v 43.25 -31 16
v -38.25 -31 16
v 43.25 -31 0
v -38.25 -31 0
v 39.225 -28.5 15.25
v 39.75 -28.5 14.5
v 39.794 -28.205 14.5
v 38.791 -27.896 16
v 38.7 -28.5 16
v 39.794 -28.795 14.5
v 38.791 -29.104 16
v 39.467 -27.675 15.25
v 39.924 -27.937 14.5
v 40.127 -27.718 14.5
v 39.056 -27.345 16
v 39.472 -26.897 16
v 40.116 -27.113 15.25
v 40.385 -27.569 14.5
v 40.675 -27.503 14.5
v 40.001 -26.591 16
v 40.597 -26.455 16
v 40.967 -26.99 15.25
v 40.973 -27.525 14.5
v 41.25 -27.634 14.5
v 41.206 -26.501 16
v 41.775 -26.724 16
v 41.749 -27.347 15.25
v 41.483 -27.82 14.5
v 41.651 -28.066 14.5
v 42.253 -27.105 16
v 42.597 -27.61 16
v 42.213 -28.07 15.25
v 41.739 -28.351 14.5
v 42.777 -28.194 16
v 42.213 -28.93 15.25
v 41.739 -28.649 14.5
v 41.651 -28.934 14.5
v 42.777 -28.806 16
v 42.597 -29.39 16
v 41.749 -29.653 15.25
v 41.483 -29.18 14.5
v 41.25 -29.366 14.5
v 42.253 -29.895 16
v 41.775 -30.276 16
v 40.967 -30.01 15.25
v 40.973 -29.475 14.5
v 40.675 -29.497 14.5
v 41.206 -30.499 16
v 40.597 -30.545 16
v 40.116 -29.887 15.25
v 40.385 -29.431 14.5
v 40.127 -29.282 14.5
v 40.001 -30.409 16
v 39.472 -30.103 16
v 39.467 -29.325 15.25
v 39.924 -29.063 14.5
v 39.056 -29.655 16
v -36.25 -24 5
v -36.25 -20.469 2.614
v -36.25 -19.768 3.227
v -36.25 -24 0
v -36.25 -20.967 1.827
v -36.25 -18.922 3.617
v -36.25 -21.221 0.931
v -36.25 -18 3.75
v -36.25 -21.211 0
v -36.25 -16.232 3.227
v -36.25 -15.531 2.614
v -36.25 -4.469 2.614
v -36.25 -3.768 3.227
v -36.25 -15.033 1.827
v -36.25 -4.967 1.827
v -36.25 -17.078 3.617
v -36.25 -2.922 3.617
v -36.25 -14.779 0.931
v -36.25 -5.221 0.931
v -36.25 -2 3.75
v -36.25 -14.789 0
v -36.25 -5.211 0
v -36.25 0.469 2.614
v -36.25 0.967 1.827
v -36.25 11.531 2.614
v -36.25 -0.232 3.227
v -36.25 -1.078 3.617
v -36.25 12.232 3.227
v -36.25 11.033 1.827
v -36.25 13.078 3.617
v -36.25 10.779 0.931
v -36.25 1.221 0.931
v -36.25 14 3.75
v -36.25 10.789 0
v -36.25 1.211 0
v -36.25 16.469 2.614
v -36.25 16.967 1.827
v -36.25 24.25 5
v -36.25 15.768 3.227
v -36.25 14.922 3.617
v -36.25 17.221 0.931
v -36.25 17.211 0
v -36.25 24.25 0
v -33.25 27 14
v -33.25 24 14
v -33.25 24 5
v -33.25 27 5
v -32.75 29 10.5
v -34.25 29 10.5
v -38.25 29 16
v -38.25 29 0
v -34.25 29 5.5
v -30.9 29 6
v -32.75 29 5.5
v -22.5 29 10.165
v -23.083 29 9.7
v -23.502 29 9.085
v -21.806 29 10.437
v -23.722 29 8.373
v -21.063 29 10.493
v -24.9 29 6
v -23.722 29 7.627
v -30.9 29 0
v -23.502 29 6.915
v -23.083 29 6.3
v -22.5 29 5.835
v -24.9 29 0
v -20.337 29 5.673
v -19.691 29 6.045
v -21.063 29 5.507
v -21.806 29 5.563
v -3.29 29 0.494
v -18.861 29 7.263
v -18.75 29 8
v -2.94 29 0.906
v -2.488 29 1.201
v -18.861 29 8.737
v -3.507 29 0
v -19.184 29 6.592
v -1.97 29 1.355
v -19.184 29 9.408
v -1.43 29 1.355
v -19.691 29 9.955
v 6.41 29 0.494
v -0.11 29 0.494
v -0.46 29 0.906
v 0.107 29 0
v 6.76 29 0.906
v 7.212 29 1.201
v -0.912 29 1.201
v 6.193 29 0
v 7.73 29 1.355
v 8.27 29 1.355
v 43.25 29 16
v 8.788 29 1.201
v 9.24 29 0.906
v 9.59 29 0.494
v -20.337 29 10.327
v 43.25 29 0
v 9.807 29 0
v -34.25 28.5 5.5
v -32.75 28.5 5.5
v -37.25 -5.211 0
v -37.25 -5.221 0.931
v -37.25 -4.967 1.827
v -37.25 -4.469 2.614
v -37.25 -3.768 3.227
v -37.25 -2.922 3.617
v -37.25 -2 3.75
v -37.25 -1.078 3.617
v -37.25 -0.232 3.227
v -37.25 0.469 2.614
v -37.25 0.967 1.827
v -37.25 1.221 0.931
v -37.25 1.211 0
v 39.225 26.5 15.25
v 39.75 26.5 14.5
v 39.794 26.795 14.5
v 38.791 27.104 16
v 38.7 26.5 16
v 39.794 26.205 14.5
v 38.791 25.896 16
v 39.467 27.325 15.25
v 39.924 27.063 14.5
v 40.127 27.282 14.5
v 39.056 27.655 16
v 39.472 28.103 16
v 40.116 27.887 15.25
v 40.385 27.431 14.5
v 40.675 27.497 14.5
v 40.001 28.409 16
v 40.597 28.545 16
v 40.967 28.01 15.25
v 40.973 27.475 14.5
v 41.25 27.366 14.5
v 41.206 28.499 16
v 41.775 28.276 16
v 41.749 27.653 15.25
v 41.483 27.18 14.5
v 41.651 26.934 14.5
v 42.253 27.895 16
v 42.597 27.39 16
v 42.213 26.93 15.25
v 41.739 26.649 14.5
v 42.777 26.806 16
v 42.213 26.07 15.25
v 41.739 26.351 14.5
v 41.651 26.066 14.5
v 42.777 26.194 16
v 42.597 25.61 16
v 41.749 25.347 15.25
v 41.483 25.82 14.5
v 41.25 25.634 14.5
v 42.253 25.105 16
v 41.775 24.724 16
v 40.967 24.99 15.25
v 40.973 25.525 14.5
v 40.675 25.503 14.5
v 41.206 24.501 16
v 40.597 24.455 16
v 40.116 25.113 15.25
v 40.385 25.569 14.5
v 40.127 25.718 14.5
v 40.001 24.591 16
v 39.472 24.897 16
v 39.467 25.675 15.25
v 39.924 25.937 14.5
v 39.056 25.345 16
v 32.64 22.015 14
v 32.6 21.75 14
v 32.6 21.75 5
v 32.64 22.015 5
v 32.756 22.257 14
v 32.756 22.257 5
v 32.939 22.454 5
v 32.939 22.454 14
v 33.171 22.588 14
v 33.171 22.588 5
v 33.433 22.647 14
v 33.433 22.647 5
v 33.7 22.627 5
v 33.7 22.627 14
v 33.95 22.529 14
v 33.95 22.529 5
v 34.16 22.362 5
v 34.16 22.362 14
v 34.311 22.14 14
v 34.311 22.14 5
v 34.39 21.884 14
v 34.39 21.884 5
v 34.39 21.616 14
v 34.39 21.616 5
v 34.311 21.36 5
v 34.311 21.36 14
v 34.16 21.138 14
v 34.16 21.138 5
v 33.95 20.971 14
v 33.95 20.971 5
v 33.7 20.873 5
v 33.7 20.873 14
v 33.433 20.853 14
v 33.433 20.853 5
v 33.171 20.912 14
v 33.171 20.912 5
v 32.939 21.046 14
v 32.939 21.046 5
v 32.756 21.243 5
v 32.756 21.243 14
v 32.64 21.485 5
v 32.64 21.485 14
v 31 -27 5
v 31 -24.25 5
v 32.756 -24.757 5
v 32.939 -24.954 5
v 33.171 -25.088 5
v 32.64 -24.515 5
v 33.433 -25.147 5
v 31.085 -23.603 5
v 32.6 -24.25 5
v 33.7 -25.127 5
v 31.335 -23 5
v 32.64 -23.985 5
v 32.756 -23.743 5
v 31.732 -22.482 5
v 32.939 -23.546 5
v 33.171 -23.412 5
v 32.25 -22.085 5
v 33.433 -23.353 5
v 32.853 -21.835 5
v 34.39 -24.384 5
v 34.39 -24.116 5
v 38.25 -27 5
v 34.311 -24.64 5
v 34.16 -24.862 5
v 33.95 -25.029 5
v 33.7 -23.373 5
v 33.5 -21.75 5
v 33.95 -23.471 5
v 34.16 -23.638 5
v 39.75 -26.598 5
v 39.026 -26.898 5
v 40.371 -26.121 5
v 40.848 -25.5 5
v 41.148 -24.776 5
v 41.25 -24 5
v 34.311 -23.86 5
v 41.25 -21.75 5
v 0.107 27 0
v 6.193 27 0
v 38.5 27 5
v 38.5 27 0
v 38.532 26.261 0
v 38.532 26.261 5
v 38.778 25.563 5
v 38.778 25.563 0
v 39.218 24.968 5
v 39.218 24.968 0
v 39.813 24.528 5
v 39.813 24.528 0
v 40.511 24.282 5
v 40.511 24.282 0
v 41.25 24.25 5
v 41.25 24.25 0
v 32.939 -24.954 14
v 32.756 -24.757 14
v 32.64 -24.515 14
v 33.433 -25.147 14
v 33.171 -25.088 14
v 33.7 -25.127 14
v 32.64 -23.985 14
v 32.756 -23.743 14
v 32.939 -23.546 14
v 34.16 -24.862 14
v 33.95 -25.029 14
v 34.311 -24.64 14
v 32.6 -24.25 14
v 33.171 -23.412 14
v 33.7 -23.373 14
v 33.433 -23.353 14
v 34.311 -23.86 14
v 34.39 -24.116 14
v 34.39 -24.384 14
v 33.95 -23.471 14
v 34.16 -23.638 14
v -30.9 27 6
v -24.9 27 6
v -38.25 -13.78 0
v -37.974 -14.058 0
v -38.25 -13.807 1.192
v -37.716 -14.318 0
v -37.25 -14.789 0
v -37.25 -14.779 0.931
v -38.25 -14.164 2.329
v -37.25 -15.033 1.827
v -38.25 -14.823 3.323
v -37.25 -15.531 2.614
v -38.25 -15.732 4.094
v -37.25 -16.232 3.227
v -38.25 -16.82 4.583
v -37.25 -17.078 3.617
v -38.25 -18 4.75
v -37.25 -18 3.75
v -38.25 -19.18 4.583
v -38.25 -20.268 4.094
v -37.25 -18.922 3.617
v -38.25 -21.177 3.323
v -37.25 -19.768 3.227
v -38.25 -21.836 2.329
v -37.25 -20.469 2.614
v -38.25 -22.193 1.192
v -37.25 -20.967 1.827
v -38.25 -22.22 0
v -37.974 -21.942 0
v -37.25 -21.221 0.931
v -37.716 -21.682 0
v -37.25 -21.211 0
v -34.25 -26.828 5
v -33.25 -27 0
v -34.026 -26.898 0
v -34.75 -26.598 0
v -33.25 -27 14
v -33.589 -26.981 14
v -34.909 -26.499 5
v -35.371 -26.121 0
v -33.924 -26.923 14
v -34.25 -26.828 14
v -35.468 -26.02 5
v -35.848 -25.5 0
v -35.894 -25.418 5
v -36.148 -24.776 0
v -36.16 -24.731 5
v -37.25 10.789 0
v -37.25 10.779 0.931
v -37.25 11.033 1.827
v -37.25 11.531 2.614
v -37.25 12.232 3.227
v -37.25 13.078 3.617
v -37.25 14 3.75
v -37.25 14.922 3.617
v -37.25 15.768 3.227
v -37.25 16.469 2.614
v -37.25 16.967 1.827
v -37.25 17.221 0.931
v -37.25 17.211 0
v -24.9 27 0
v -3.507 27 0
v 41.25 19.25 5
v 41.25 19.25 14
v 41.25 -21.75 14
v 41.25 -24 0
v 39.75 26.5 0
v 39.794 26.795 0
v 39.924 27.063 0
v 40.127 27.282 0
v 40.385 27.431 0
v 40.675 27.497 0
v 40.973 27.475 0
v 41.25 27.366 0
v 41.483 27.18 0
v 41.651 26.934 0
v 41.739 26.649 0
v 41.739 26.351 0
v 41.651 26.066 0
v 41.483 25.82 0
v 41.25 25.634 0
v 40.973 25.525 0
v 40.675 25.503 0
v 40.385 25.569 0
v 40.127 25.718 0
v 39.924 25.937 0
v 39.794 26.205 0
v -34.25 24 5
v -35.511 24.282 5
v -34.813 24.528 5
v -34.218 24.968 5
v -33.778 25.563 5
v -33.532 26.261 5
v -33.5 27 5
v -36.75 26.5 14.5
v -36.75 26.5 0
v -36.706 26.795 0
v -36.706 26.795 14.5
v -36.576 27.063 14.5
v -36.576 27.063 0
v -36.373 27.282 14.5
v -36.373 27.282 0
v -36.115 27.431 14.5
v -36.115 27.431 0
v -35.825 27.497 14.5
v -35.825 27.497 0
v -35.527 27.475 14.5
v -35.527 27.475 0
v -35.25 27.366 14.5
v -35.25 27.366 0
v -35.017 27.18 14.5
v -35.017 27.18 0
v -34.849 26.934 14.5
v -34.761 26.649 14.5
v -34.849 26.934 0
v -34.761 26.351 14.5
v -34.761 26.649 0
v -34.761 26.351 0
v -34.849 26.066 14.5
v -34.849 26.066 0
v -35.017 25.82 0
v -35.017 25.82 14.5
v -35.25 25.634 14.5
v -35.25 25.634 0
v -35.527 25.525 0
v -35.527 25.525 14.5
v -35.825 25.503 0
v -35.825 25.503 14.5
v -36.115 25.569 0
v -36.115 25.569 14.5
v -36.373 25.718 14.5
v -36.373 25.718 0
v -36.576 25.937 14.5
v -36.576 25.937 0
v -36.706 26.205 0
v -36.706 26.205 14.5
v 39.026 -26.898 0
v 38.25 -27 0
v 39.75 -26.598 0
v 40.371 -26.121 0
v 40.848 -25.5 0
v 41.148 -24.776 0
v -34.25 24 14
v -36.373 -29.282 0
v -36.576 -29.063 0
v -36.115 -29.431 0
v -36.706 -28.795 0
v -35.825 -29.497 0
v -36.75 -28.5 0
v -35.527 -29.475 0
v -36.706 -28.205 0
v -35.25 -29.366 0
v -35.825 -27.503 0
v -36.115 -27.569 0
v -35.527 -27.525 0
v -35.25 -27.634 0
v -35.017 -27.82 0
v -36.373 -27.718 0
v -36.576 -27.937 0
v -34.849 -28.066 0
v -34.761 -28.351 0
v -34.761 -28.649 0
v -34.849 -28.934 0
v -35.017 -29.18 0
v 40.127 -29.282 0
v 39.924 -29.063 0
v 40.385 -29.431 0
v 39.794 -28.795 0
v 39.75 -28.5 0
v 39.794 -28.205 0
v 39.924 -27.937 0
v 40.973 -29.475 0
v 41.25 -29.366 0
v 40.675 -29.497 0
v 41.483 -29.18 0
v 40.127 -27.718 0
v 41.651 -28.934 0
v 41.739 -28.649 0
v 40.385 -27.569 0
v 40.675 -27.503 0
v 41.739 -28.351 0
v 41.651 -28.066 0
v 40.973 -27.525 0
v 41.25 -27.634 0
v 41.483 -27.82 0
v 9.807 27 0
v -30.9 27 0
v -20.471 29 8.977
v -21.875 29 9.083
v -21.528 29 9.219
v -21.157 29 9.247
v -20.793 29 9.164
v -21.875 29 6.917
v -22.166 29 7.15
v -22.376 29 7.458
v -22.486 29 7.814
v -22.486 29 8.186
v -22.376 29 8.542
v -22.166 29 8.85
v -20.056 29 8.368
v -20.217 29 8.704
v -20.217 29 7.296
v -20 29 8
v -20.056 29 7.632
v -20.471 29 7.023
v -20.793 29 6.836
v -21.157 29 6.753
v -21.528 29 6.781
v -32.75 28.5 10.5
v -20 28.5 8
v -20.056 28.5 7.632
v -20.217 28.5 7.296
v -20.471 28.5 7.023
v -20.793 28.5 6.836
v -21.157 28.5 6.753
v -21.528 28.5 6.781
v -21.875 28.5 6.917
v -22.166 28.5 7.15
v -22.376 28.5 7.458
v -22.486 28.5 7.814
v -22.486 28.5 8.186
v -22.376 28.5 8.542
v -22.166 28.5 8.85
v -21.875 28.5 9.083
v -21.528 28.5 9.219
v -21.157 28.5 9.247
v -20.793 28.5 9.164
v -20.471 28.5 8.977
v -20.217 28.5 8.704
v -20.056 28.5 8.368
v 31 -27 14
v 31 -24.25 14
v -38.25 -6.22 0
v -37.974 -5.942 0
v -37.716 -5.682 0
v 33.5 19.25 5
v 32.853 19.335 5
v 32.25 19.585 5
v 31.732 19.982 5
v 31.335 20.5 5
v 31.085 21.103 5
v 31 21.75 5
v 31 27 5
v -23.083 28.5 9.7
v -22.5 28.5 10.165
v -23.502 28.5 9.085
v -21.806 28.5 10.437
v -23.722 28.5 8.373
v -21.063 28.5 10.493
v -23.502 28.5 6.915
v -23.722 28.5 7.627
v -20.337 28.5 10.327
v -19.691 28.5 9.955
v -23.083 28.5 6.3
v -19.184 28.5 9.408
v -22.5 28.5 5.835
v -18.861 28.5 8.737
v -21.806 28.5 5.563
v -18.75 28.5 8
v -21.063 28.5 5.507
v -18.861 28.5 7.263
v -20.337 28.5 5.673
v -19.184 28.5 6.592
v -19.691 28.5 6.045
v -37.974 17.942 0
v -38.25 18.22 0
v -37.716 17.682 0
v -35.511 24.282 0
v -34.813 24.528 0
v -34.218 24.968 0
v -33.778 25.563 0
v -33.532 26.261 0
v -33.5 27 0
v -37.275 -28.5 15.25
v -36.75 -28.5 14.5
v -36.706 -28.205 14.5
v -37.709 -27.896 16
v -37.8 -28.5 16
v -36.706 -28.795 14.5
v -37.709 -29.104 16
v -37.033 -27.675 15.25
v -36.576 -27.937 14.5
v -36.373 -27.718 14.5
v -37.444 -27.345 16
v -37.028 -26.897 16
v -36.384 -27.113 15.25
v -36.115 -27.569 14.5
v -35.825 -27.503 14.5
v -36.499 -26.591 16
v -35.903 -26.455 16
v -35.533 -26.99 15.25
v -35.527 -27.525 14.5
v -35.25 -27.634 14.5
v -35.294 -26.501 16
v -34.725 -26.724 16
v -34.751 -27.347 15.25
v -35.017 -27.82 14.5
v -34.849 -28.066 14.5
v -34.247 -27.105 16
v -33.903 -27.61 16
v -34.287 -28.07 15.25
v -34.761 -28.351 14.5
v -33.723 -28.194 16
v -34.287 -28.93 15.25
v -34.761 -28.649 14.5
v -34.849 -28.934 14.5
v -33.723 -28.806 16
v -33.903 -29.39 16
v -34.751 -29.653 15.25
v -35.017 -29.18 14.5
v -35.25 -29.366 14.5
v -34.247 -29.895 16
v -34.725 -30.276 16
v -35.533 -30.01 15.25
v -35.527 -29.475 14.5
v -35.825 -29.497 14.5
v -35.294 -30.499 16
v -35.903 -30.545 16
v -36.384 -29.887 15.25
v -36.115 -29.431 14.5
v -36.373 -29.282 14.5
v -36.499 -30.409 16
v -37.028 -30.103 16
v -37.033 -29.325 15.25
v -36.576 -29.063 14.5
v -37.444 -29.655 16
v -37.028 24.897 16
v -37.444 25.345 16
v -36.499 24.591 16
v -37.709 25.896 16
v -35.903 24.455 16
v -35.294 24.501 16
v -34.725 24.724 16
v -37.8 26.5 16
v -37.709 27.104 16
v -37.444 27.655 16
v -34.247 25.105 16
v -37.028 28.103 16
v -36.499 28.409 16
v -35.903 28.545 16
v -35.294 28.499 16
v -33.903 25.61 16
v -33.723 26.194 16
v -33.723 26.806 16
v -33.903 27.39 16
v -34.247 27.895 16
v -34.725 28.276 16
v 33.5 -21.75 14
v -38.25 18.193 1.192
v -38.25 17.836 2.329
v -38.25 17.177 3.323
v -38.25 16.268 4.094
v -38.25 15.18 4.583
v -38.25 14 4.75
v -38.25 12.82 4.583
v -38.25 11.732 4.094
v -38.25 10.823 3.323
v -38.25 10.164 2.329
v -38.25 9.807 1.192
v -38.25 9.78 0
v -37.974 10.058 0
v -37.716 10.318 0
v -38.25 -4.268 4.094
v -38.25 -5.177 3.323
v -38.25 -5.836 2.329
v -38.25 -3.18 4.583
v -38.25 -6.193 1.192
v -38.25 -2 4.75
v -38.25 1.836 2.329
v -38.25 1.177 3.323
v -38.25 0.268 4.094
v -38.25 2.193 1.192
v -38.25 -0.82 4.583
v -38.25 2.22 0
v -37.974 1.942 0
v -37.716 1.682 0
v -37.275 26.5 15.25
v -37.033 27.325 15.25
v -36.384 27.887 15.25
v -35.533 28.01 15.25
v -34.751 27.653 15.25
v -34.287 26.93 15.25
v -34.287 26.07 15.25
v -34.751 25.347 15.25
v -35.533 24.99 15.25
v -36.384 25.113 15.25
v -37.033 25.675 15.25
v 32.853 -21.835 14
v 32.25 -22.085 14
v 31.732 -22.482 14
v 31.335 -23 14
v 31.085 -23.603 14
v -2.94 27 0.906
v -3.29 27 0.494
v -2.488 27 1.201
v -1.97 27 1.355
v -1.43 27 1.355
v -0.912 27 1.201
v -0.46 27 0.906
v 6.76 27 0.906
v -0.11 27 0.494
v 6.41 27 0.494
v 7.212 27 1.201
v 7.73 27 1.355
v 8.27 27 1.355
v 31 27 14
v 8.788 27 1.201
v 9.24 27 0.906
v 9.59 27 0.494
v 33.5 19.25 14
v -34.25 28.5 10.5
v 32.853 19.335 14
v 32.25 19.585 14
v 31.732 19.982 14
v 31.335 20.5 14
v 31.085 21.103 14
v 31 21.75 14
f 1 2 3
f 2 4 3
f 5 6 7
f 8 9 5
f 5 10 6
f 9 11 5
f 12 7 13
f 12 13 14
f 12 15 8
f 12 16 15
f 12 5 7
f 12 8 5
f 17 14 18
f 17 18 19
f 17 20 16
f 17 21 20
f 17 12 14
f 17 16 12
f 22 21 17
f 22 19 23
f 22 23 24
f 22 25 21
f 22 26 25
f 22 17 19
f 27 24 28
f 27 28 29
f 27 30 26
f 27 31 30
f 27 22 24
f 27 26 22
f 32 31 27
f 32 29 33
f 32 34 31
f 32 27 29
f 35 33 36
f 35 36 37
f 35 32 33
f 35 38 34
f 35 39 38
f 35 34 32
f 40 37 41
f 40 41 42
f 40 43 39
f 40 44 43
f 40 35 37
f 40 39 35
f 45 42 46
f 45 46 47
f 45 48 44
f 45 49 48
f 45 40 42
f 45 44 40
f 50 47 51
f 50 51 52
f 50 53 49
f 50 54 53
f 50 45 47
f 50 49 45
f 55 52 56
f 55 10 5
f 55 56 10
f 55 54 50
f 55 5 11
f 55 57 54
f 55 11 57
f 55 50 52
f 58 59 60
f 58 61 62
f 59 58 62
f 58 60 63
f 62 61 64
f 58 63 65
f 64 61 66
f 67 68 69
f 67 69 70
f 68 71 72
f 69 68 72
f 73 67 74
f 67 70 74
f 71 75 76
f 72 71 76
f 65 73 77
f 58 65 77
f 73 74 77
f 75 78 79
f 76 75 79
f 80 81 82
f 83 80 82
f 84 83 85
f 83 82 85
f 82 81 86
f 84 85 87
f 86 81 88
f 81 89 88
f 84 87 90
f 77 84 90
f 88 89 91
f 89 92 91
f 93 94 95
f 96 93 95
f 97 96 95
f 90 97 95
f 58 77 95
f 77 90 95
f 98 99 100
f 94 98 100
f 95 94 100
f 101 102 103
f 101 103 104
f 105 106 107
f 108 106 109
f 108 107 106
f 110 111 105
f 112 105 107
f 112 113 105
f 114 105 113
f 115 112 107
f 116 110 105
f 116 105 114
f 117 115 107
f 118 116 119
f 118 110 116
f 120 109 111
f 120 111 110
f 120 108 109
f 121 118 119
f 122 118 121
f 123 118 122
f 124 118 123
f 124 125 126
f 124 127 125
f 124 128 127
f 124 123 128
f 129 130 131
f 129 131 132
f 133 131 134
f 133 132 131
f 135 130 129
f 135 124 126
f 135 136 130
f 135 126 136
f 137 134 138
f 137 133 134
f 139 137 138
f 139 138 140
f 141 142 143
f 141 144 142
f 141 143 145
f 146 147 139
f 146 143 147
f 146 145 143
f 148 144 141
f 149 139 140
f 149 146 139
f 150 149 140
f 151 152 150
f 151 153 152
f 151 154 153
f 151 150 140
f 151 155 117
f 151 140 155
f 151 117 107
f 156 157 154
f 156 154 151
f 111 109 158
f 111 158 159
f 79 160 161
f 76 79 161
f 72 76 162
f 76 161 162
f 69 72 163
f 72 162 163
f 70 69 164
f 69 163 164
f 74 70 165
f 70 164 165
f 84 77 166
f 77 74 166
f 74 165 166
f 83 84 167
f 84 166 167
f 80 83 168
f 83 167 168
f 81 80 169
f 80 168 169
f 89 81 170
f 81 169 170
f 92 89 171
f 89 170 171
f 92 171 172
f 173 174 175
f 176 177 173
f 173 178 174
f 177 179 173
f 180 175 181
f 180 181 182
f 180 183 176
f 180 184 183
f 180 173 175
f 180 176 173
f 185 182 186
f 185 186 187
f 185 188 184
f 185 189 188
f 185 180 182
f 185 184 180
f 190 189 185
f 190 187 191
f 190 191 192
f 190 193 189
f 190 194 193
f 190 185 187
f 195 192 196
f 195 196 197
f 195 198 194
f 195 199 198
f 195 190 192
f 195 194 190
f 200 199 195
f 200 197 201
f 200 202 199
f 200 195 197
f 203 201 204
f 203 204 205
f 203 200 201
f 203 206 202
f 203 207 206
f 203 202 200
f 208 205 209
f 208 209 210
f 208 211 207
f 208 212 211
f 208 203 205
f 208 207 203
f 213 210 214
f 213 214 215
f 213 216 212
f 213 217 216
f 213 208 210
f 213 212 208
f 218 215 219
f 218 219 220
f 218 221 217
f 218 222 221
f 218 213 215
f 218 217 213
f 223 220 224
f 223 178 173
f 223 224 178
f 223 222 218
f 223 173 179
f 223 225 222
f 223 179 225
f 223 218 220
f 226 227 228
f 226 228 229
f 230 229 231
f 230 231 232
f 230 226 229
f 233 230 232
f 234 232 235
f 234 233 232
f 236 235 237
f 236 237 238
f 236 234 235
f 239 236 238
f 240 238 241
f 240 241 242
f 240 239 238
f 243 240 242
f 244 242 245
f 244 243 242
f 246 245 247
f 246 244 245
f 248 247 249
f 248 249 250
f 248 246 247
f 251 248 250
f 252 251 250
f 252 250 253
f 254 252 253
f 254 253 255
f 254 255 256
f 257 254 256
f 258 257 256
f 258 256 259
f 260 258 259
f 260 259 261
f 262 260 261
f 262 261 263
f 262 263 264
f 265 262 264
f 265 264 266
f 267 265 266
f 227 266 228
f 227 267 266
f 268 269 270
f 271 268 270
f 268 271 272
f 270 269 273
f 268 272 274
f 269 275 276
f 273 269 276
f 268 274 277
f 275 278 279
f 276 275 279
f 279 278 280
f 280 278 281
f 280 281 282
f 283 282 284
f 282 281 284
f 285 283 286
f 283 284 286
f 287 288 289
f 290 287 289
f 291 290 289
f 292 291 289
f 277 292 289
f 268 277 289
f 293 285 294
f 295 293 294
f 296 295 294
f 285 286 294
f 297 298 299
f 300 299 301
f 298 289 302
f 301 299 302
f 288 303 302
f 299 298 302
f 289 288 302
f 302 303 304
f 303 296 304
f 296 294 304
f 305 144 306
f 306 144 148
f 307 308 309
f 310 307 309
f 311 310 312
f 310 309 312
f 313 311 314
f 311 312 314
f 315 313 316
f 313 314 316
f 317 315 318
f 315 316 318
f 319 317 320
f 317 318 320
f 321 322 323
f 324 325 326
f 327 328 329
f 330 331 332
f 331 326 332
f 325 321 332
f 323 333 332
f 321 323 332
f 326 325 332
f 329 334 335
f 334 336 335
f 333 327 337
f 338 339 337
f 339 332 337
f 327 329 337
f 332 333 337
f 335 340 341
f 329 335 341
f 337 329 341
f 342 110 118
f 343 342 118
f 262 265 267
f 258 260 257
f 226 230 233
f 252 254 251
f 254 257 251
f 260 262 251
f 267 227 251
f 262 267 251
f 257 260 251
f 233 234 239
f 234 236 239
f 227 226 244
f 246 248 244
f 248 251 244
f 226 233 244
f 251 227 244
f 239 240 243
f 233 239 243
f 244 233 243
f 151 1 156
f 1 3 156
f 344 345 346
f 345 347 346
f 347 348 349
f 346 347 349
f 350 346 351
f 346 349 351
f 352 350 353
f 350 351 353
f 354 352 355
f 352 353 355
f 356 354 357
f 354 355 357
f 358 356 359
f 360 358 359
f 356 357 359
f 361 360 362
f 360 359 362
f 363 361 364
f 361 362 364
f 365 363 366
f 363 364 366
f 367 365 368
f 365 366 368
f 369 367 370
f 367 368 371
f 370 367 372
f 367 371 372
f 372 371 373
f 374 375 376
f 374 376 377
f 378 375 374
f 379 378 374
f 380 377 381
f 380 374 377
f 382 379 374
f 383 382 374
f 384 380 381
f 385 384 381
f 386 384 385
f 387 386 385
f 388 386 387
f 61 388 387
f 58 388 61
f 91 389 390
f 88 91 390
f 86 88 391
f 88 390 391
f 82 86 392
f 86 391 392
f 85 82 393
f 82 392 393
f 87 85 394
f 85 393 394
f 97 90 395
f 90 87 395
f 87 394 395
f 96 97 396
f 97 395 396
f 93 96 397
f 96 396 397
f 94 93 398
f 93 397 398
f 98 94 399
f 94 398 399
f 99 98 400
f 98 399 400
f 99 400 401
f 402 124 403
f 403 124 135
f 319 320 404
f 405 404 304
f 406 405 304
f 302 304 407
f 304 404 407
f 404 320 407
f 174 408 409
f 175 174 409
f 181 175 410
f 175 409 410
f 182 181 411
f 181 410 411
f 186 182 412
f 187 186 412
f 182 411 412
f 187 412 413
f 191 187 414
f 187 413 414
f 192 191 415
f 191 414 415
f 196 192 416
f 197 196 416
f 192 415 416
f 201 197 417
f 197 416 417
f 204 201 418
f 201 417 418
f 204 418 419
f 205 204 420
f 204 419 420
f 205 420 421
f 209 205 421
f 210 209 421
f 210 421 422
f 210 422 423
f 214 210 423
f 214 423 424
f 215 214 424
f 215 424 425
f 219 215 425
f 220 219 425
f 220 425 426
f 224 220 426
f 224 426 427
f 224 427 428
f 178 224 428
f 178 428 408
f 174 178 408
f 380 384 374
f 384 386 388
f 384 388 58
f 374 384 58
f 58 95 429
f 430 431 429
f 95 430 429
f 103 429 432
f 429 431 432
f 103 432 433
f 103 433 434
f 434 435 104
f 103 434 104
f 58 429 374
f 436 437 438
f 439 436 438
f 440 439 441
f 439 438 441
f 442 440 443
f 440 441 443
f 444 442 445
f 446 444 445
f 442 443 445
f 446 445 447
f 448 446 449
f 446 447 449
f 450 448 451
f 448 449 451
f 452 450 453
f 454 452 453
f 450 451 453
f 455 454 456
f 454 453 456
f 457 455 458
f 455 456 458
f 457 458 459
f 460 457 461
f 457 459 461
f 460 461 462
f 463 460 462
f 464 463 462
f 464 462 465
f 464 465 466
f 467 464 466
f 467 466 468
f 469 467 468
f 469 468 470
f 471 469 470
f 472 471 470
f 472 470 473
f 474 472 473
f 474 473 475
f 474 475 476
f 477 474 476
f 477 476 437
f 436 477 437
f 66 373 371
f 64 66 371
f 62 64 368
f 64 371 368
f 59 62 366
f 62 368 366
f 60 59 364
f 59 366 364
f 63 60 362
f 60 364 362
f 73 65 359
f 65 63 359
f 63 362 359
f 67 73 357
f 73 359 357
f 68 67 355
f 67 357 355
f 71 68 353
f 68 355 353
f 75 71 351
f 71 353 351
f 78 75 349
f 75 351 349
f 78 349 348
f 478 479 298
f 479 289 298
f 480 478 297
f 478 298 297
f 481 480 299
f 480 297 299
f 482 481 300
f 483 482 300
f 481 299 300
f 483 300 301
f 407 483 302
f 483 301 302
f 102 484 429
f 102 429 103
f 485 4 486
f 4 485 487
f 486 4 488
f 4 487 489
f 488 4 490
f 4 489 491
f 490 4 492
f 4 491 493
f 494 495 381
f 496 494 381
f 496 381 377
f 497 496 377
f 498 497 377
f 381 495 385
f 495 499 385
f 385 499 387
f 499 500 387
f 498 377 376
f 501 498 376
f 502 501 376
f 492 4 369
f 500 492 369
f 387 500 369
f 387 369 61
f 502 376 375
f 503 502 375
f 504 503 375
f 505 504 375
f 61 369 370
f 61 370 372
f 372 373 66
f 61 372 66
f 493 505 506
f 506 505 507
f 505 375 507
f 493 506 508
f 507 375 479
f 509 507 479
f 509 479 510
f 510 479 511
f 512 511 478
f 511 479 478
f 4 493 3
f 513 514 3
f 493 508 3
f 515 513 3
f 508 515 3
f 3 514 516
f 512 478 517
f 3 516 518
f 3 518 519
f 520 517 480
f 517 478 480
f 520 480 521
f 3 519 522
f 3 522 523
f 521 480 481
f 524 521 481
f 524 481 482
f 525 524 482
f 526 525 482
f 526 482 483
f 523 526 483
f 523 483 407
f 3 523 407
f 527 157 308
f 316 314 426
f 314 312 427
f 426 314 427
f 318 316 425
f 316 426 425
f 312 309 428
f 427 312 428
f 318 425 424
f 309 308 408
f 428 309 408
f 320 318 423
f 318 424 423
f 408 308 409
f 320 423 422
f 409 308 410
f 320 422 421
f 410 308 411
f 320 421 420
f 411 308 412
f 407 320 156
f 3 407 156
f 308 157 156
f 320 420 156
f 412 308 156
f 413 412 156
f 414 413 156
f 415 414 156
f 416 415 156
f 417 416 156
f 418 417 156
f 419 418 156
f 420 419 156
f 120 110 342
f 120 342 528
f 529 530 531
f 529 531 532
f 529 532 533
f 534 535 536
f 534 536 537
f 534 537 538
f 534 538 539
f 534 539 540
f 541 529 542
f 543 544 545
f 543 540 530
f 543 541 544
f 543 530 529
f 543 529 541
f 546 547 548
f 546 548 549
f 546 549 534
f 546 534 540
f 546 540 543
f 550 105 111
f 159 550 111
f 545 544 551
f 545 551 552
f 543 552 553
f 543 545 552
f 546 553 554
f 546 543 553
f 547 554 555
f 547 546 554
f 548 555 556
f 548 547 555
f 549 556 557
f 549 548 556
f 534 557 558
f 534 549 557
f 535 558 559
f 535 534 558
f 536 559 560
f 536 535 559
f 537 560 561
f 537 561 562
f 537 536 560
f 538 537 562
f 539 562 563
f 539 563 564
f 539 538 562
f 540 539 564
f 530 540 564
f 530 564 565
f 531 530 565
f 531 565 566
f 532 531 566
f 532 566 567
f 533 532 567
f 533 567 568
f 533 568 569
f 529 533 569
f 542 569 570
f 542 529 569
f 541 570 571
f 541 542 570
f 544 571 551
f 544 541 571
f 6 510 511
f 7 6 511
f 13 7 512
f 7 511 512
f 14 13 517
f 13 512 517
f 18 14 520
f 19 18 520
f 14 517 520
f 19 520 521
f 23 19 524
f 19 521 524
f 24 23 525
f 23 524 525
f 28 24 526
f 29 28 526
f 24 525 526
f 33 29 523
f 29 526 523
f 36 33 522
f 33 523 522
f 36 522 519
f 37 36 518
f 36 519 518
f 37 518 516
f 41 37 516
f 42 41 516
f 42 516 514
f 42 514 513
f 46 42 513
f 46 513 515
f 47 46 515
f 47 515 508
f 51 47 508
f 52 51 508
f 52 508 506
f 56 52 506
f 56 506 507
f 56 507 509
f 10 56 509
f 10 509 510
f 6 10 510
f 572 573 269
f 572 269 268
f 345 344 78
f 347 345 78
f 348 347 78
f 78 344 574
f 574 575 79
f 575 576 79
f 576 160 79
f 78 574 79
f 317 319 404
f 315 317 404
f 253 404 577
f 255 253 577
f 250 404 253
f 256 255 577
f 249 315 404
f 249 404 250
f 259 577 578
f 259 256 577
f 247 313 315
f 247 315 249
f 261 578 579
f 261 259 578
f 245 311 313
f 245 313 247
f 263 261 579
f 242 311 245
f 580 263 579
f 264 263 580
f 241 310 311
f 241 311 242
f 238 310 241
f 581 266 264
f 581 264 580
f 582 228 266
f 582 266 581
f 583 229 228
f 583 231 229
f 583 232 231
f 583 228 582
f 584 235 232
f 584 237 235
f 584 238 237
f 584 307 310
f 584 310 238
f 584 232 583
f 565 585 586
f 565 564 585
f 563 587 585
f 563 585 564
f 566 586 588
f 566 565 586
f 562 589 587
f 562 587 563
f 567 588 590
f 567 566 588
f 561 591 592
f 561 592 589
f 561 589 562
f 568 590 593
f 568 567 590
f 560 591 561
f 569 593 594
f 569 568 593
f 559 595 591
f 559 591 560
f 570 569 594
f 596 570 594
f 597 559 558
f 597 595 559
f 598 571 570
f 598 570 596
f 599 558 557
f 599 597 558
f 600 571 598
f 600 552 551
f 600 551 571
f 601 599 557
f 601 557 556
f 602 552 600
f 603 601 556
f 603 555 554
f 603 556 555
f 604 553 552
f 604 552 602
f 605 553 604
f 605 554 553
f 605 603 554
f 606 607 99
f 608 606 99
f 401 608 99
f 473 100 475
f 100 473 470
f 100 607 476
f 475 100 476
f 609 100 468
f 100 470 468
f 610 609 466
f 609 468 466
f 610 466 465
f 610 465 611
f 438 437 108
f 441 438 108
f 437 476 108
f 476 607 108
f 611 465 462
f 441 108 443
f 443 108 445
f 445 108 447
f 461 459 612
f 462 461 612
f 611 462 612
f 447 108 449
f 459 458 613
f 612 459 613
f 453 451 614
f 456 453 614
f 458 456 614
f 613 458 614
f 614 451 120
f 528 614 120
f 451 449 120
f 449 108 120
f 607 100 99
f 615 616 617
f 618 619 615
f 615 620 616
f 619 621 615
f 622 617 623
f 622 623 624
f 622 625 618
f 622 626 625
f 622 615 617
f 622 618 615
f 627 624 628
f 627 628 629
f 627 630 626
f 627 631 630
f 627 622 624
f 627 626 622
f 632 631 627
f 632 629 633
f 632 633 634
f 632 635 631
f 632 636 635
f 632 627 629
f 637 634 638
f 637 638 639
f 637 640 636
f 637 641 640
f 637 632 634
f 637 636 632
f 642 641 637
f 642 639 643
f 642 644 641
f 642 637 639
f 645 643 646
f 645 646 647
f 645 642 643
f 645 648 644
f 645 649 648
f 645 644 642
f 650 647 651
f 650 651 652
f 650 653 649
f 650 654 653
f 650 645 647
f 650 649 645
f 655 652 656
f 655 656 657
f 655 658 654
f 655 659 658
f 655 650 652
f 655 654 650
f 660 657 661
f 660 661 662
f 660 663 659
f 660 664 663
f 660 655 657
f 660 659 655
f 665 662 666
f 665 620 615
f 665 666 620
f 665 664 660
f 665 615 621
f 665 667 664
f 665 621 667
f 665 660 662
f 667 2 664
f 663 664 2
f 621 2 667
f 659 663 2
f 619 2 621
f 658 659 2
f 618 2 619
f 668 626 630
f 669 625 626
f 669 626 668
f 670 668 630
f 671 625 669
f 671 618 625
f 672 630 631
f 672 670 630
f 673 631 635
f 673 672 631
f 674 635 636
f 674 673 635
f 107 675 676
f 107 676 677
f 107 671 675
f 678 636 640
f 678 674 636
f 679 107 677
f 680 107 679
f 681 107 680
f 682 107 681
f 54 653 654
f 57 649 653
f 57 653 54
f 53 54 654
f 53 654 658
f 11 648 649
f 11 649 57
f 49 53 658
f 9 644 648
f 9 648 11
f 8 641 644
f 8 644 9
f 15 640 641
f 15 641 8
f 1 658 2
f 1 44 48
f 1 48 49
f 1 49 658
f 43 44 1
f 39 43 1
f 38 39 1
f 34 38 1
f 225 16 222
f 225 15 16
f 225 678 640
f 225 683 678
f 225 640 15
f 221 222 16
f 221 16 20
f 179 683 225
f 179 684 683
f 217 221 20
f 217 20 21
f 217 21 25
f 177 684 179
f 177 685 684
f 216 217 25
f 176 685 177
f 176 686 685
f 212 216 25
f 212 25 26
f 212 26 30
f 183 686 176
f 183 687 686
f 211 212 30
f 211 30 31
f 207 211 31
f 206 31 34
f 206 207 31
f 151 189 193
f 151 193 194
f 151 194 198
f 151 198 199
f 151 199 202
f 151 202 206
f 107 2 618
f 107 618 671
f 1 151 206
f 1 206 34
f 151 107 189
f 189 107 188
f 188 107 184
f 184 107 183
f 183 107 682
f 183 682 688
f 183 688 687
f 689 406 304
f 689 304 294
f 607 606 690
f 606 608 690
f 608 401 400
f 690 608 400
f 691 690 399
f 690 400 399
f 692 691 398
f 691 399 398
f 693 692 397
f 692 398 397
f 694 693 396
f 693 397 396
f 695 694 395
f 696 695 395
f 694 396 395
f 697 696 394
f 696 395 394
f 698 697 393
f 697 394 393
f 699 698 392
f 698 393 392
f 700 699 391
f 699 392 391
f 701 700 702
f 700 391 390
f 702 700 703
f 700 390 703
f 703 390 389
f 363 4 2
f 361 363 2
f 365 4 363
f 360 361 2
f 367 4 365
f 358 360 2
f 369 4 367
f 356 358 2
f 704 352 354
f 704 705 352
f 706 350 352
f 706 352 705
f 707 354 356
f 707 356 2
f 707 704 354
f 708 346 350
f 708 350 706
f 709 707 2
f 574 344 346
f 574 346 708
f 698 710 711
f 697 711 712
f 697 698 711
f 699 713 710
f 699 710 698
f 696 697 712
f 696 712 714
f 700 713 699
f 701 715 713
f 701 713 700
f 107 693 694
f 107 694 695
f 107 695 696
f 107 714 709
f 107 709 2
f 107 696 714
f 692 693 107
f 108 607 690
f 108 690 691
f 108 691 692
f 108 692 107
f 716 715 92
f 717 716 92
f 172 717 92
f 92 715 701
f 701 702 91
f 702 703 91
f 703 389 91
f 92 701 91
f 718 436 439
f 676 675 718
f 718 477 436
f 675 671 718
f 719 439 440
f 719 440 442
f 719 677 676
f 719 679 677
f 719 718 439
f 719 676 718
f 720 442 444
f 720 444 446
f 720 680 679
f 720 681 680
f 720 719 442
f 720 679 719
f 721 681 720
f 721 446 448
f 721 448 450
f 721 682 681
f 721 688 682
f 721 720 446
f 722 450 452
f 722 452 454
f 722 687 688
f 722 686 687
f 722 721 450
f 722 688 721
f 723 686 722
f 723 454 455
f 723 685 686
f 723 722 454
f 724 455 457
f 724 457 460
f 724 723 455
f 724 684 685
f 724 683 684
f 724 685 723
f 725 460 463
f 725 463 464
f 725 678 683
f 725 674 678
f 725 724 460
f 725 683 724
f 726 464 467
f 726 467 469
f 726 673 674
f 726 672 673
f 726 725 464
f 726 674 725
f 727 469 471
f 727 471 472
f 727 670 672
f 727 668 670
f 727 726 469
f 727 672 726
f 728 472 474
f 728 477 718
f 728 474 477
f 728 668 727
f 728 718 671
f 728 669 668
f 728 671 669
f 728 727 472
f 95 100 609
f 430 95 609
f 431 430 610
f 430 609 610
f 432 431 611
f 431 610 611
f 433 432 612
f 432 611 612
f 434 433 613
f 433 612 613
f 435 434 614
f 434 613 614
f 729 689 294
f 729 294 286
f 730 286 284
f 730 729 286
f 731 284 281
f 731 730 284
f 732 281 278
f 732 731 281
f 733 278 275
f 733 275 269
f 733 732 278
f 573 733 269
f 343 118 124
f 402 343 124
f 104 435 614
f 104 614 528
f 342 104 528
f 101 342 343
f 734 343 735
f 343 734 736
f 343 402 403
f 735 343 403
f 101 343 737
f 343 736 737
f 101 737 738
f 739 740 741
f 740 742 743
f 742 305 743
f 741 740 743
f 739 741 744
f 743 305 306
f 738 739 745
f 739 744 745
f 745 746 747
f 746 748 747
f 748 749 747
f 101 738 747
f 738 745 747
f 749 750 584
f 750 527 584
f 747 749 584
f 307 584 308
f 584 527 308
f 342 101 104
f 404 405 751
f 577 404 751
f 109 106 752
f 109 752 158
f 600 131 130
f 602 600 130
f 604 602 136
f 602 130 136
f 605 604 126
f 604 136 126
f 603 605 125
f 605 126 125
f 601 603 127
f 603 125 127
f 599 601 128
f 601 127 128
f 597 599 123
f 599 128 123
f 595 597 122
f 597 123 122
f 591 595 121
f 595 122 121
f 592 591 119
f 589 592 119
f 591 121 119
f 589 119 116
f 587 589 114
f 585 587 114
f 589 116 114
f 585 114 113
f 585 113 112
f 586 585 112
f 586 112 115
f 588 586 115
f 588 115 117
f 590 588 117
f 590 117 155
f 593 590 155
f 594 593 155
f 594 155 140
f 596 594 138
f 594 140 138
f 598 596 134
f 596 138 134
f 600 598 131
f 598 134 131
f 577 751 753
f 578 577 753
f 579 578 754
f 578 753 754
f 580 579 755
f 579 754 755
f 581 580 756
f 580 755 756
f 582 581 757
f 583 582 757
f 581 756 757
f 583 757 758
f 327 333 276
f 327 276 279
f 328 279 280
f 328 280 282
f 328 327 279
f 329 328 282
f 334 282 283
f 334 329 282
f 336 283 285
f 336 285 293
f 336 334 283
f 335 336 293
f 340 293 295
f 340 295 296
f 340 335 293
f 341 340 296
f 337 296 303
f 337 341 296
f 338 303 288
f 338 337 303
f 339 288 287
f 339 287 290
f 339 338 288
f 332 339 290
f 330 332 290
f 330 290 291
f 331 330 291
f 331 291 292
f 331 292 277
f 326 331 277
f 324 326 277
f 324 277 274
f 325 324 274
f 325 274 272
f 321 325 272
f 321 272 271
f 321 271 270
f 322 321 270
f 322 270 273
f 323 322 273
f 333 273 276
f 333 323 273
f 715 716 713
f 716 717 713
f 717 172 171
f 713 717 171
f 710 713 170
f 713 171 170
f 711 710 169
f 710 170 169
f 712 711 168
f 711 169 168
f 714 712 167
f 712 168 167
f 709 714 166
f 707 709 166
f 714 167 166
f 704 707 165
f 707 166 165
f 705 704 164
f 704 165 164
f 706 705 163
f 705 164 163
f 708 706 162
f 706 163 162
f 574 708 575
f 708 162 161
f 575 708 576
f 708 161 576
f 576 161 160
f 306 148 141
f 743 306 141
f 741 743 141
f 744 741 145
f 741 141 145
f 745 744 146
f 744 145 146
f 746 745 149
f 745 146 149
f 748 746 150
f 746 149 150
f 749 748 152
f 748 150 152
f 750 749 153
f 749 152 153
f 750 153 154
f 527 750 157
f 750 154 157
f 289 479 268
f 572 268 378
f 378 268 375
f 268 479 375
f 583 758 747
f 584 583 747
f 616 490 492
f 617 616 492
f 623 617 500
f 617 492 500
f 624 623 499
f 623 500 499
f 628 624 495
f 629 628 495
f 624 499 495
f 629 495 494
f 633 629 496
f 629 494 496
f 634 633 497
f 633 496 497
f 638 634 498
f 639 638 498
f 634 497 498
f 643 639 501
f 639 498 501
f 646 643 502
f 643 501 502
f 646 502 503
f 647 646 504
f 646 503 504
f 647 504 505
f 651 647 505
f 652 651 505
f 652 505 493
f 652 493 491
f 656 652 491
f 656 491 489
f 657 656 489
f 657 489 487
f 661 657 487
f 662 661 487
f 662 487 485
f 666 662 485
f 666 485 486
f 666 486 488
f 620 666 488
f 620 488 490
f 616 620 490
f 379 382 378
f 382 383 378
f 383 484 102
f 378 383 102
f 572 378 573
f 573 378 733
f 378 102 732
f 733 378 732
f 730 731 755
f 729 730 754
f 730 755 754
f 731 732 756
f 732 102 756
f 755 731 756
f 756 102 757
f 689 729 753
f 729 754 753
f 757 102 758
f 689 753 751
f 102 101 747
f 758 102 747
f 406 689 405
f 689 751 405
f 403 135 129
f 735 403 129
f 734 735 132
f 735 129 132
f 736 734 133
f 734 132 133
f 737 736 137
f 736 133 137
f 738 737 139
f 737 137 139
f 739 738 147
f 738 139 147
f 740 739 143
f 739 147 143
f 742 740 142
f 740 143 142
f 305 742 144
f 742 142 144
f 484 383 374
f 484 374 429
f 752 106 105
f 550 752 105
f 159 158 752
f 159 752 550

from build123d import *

# Parameters (mm, degrees)
SKETCH1_W             = 81.5
SKETCH1_H             = 60
BOSS_EXTRUDE1_DEPTH   = 14
SKETCH3_W             = 81.5
SKETCH3_H             = 60
BOSS_EXTRUDE2_DEPTH   = 2
SKETCH4_R             = 3.25
CUT_EXTRUDE1_DEPTH    = 2
SKETCH5_R             = 1.875
CUT_EXTRUDE2_DEPTH    = 2
SKETCH6_R             = 0.9
BOSS_EXTRUDE3_DEPTH   = 9
BOSS_EXTRUDE4_DEPTH   = 9
FILLET1_R             = 3
SKETCH9_R             = 1
CUT_EXTRUDE3_DEPTH    = 17
CHAMFER1_SIZE         = 1.5
CHAMFER1_SIZE2        = 1.050311307
CHAMFER1_PART_2_SIZE  = 1.5
CHAMFER1_PART_2_SIZE2 = 1.050311307
CHAMFER1_PART_3_SIZE  = 1.5
CHAMFER1_PART_3_SIZE2 = 1.050311307
CHAMFER1_PART_4_SIZE  = 1.5
CHAMFER1_PART_4_SIZE2 = 1.050311307
CUT_EXTRUDE4_REACH    = 62
SKETCH10_W            = 6
SKETCH10_H            = 6
CHAMFER2_SIZE         = 1
SKETCH11_R            = 2.5
SKETCH11_R_2          = 1.25
SKETCH11_W            = 1.5
SKETCH11_H            = 5
CUT_EXTRUDE5_DEPTH    = 0.5


with BuildPart() as part:
    # Sketch1 → Boss-Extrude1 (new body)
    with BuildSketch(Plane.XY):
        with Locations((2.5, -1)):
            Rectangle(SKETCH1_W, SKETCH1_H)
        with BuildLine():
            Line((-36.25, -27), (-36.25, 24.25))
            ThreePointArc((-36.25, 24.25), (-34.218257349, 24.968257349), (-33.5, 27))
            Line((-33.5, 27), (38.5, 27))
            ThreePointArc((38.5, 27), (39.218257349, 24.968257349), (41.25, 24.25))
            Line((41.25, 24.25), (41.25, -27))
            Line((41.25, -27), (-36.25, -27))
        make_face(mode=Mode.SUBTRACT)
    extrude(amount=BOSS_EXTRUDE1_DEPTH)

    # Sketch3 → Boss-Extrude2 (add)
    with BuildSketch(Plane.XY.offset(14)):
        with Locations((2.5, -1)):
            Rectangle(SKETCH3_W, SKETCH3_H)
    extrude(amount=BOSS_EXTRUDE2_DEPTH)

    # Sketch4 → Cut-Extrude1 (cut)
    with BuildSketch(Plane.ZY.offset(38.25)):
        with Locations((0.5, -18)):
            Circle(SKETCH4_R)
        with Locations((0.5, -2)):
            Circle(SKETCH4_R)
        with Locations((0.5, 14)):
            Circle(SKETCH4_R)
    extrude(amount=-CUT_EXTRUDE1_DEPTH, mode=Mode.SUBTRACT)

    # Sketch5 → Cut-Extrude2 (cut)
    with BuildSketch(Plane(origin=(0, 29, 0), x_dir=(1, 0, 0), z_dir=(0, 1, 0))):
        with Locations((8, 0.5)):
            Circle(SKETCH5_R)
        with Locations((-1.7, 0.5)):
            Circle(SKETCH5_R)
    extrude(amount=-CUT_EXTRUDE2_DEPTH, mode=Mode.SUBTRACT)

    # Sketch6 → Boss-Extrude3 (add)
    with BuildSketch(Plane(origin=(0, 0, 14), x_dir=(-1, 0, 0), z_dir=(0, 0, -1))):
        with BuildLine():
            Line((-31, -24.25), (-31, -27))
            Line((-31, -27), (-41.25, -27))
            Line((-41.25, -27), (-41.25, -21.75))
            Line((-41.25, -21.75), (-33.5, -21.75))
            ThreePointArc((-33.5, -21.75), (-31.732233047, -22.482233047), (-31, -24.25))
        make_face()
        with Locations((-33.5, -24.25)):
            Circle(SKETCH6_R, mode=Mode.SUBTRACT)
        with BuildLine():
            Line((-41.25, 19.25), (-33.5, 19.25))
            ThreePointArc((-33.5, 19.25), (-31.732233047, 19.982233047), (-31, 21.75))
            Line((-31, 21.75), (-31, 27))
            Line((-31, 27), (-41.25, 27))
            Line((-41.25, 27), (-41.25, 19.25))
        make_face()
        with Locations((-33.5, 21.75)):
            Circle(SKETCH6_R, mode=Mode.SUBTRACT)
    extrude(amount=BOSS_EXTRUDE3_DEPTH)

    # Sketch7 → Boss-Extrude4 (add)
    with BuildSketch(Plane(origin=(0, 0, 14), x_dir=(-1, 0, 0), z_dir=(0, 0, -1))):
        Polygon((36.25, -27), (34.25, -27), (34.25, 24), (33.25, 24), (33.25, 27), (36.25, 27), align=None)
    extrude(amount=BOSS_EXTRUDE4_DEPTH)

    # Fillet1
    fillet1_edges = [part.edges().sort_by_distance(p)[0] for p in [
        (41.25, -27, 2.5),
        (-36.25, -27, 2.5),
    ]]
    fillet(fillet1_edges, radius=FILLET1_R)

    # Sketch9 → Cut-Extrude3 (cut, through all)
    with BuildSketch(Plane(origin=(0, 0, 0), x_dir=(-1, 0, 0), z_dir=(0, 0, -1))):
        with Locations((35.75, -28.5)):
            Circle(SKETCH9_R)
        with Locations((-40.75, -28.5)):
            Circle(SKETCH9_R)
        with Locations((-40.75, 26.5)):
            Circle(SKETCH9_R)
        with Locations((35.75, 26.5)):
            Circle(SKETCH9_R)
    extrude(amount=-CUT_EXTRUDE3_DEPTH, mode=Mode.SUBTRACT)

    # Chamfer1
    chamfer1_edges = [part.edges().sort_by_distance(p)[0] for p in [
        (-34.75, 26.5, 16),
    ]]
    chamfer1_side = [part.faces().sort_by_distance(p)[0] for p in [
        (-34.75, 26.5, 8),
    ]]
    chamfer(chamfer1_edges, length=CHAMFER1_SIZE, length2=CHAMFER1_SIZE2, reference=chamfer1_side[0])

    # Chamfer1 part 2
    chamfer1_part_2_edges = [part.edges().sort_by_distance(p)[0] for p in [
        (41.75, 26.5, 16),
    ]]
    chamfer1_part_2_side = [part.faces().sort_by_distance(p)[0] for p in [
        (41.75, 26.5, 8),
    ]]
    chamfer(chamfer1_part_2_edges, length=CHAMFER1_PART_2_SIZE, length2=CHAMFER1_PART_2_SIZE2, reference=chamfer1_part_2_side[0])

    # Chamfer1 part 3
    chamfer1_part_3_edges = [part.edges().sort_by_distance(p)[0] for p in [
        (41.75, -28.5, 16),
    ]]
    chamfer1_part_3_side = [part.faces().sort_by_distance(p)[0] for p in [
        (41.75, -28.5, 8),
    ]]
    chamfer(chamfer1_part_3_edges, length=CHAMFER1_PART_3_SIZE, length2=CHAMFER1_PART_3_SIZE2, reference=chamfer1_part_3_side[0])

    # Chamfer1 part 4
    chamfer1_part_4_edges = [part.edges().sort_by_distance(p)[0] for p in [
        (-34.75, -28.5, 16),
    ]]
    chamfer1_part_4_side = [part.faces().sort_by_distance(p)[0] for p in [
        (-34.75, -28.5, 8),
    ]]
    chamfer(chamfer1_part_4_edges, length=CHAMFER1_PART_4_SIZE, length2=CHAMFER1_PART_4_SIZE2, reference=chamfer1_part_4_side[0])

    # Sketch10 → Cut-Extrude4 (cut, up to next)
    with BuildSketch(Plane(origin=(0, 29, 0), x_dir=(1, 0, 0), z_dir=(0, 1, 0)), mode=Mode.PRIVATE) as cut_extrude4_sk1:
        with Locations((-27.9, -3)):
            Rectangle(SKETCH10_W, SKETCH10_H)
    cut_extrude4_tool1 = extrude(cut_extrude4_sk1.sketch, amount=-CUT_EXTRUDE4_REACH, mode=Mode.PRIVATE) & part.part
    add(cut_extrude4_tool1.solids().sort_by_distance((-27.9, 29, 3))[0], mode=Mode.SUBTRACT)

    # Chamfer2
    chamfer2_edges = [part.edges().sort_by_distance(p)[0] for p in [
        (-38.25, -18, 3.75),
        (-38.25, -2, 3.75),
        (-38.25, 14, 3.75),
    ]]
    chamfer(chamfer2_edges, length=CHAMFER2_SIZE)

    # Sketch11 → Cut-Extrude5 (cut)
    with BuildSketch(Plane(origin=(0, 29, 0), x_dir=(1, 0, 0), z_dir=(0, 1, 0))):
        with Locations((-21.25, -8)):
            Circle(SKETCH11_R)
        with Locations((-21.25, -8)):
            Circle(SKETCH11_R_2, mode=Mode.SUBTRACT)
        with Locations((-33.5, -8)):
            Rectangle(SKETCH11_W, SKETCH11_H)
    extrude(amount=-CUT_EXTRUDE5_DEPTH, mode=Mode.SUBTRACT)


solid = part.part
